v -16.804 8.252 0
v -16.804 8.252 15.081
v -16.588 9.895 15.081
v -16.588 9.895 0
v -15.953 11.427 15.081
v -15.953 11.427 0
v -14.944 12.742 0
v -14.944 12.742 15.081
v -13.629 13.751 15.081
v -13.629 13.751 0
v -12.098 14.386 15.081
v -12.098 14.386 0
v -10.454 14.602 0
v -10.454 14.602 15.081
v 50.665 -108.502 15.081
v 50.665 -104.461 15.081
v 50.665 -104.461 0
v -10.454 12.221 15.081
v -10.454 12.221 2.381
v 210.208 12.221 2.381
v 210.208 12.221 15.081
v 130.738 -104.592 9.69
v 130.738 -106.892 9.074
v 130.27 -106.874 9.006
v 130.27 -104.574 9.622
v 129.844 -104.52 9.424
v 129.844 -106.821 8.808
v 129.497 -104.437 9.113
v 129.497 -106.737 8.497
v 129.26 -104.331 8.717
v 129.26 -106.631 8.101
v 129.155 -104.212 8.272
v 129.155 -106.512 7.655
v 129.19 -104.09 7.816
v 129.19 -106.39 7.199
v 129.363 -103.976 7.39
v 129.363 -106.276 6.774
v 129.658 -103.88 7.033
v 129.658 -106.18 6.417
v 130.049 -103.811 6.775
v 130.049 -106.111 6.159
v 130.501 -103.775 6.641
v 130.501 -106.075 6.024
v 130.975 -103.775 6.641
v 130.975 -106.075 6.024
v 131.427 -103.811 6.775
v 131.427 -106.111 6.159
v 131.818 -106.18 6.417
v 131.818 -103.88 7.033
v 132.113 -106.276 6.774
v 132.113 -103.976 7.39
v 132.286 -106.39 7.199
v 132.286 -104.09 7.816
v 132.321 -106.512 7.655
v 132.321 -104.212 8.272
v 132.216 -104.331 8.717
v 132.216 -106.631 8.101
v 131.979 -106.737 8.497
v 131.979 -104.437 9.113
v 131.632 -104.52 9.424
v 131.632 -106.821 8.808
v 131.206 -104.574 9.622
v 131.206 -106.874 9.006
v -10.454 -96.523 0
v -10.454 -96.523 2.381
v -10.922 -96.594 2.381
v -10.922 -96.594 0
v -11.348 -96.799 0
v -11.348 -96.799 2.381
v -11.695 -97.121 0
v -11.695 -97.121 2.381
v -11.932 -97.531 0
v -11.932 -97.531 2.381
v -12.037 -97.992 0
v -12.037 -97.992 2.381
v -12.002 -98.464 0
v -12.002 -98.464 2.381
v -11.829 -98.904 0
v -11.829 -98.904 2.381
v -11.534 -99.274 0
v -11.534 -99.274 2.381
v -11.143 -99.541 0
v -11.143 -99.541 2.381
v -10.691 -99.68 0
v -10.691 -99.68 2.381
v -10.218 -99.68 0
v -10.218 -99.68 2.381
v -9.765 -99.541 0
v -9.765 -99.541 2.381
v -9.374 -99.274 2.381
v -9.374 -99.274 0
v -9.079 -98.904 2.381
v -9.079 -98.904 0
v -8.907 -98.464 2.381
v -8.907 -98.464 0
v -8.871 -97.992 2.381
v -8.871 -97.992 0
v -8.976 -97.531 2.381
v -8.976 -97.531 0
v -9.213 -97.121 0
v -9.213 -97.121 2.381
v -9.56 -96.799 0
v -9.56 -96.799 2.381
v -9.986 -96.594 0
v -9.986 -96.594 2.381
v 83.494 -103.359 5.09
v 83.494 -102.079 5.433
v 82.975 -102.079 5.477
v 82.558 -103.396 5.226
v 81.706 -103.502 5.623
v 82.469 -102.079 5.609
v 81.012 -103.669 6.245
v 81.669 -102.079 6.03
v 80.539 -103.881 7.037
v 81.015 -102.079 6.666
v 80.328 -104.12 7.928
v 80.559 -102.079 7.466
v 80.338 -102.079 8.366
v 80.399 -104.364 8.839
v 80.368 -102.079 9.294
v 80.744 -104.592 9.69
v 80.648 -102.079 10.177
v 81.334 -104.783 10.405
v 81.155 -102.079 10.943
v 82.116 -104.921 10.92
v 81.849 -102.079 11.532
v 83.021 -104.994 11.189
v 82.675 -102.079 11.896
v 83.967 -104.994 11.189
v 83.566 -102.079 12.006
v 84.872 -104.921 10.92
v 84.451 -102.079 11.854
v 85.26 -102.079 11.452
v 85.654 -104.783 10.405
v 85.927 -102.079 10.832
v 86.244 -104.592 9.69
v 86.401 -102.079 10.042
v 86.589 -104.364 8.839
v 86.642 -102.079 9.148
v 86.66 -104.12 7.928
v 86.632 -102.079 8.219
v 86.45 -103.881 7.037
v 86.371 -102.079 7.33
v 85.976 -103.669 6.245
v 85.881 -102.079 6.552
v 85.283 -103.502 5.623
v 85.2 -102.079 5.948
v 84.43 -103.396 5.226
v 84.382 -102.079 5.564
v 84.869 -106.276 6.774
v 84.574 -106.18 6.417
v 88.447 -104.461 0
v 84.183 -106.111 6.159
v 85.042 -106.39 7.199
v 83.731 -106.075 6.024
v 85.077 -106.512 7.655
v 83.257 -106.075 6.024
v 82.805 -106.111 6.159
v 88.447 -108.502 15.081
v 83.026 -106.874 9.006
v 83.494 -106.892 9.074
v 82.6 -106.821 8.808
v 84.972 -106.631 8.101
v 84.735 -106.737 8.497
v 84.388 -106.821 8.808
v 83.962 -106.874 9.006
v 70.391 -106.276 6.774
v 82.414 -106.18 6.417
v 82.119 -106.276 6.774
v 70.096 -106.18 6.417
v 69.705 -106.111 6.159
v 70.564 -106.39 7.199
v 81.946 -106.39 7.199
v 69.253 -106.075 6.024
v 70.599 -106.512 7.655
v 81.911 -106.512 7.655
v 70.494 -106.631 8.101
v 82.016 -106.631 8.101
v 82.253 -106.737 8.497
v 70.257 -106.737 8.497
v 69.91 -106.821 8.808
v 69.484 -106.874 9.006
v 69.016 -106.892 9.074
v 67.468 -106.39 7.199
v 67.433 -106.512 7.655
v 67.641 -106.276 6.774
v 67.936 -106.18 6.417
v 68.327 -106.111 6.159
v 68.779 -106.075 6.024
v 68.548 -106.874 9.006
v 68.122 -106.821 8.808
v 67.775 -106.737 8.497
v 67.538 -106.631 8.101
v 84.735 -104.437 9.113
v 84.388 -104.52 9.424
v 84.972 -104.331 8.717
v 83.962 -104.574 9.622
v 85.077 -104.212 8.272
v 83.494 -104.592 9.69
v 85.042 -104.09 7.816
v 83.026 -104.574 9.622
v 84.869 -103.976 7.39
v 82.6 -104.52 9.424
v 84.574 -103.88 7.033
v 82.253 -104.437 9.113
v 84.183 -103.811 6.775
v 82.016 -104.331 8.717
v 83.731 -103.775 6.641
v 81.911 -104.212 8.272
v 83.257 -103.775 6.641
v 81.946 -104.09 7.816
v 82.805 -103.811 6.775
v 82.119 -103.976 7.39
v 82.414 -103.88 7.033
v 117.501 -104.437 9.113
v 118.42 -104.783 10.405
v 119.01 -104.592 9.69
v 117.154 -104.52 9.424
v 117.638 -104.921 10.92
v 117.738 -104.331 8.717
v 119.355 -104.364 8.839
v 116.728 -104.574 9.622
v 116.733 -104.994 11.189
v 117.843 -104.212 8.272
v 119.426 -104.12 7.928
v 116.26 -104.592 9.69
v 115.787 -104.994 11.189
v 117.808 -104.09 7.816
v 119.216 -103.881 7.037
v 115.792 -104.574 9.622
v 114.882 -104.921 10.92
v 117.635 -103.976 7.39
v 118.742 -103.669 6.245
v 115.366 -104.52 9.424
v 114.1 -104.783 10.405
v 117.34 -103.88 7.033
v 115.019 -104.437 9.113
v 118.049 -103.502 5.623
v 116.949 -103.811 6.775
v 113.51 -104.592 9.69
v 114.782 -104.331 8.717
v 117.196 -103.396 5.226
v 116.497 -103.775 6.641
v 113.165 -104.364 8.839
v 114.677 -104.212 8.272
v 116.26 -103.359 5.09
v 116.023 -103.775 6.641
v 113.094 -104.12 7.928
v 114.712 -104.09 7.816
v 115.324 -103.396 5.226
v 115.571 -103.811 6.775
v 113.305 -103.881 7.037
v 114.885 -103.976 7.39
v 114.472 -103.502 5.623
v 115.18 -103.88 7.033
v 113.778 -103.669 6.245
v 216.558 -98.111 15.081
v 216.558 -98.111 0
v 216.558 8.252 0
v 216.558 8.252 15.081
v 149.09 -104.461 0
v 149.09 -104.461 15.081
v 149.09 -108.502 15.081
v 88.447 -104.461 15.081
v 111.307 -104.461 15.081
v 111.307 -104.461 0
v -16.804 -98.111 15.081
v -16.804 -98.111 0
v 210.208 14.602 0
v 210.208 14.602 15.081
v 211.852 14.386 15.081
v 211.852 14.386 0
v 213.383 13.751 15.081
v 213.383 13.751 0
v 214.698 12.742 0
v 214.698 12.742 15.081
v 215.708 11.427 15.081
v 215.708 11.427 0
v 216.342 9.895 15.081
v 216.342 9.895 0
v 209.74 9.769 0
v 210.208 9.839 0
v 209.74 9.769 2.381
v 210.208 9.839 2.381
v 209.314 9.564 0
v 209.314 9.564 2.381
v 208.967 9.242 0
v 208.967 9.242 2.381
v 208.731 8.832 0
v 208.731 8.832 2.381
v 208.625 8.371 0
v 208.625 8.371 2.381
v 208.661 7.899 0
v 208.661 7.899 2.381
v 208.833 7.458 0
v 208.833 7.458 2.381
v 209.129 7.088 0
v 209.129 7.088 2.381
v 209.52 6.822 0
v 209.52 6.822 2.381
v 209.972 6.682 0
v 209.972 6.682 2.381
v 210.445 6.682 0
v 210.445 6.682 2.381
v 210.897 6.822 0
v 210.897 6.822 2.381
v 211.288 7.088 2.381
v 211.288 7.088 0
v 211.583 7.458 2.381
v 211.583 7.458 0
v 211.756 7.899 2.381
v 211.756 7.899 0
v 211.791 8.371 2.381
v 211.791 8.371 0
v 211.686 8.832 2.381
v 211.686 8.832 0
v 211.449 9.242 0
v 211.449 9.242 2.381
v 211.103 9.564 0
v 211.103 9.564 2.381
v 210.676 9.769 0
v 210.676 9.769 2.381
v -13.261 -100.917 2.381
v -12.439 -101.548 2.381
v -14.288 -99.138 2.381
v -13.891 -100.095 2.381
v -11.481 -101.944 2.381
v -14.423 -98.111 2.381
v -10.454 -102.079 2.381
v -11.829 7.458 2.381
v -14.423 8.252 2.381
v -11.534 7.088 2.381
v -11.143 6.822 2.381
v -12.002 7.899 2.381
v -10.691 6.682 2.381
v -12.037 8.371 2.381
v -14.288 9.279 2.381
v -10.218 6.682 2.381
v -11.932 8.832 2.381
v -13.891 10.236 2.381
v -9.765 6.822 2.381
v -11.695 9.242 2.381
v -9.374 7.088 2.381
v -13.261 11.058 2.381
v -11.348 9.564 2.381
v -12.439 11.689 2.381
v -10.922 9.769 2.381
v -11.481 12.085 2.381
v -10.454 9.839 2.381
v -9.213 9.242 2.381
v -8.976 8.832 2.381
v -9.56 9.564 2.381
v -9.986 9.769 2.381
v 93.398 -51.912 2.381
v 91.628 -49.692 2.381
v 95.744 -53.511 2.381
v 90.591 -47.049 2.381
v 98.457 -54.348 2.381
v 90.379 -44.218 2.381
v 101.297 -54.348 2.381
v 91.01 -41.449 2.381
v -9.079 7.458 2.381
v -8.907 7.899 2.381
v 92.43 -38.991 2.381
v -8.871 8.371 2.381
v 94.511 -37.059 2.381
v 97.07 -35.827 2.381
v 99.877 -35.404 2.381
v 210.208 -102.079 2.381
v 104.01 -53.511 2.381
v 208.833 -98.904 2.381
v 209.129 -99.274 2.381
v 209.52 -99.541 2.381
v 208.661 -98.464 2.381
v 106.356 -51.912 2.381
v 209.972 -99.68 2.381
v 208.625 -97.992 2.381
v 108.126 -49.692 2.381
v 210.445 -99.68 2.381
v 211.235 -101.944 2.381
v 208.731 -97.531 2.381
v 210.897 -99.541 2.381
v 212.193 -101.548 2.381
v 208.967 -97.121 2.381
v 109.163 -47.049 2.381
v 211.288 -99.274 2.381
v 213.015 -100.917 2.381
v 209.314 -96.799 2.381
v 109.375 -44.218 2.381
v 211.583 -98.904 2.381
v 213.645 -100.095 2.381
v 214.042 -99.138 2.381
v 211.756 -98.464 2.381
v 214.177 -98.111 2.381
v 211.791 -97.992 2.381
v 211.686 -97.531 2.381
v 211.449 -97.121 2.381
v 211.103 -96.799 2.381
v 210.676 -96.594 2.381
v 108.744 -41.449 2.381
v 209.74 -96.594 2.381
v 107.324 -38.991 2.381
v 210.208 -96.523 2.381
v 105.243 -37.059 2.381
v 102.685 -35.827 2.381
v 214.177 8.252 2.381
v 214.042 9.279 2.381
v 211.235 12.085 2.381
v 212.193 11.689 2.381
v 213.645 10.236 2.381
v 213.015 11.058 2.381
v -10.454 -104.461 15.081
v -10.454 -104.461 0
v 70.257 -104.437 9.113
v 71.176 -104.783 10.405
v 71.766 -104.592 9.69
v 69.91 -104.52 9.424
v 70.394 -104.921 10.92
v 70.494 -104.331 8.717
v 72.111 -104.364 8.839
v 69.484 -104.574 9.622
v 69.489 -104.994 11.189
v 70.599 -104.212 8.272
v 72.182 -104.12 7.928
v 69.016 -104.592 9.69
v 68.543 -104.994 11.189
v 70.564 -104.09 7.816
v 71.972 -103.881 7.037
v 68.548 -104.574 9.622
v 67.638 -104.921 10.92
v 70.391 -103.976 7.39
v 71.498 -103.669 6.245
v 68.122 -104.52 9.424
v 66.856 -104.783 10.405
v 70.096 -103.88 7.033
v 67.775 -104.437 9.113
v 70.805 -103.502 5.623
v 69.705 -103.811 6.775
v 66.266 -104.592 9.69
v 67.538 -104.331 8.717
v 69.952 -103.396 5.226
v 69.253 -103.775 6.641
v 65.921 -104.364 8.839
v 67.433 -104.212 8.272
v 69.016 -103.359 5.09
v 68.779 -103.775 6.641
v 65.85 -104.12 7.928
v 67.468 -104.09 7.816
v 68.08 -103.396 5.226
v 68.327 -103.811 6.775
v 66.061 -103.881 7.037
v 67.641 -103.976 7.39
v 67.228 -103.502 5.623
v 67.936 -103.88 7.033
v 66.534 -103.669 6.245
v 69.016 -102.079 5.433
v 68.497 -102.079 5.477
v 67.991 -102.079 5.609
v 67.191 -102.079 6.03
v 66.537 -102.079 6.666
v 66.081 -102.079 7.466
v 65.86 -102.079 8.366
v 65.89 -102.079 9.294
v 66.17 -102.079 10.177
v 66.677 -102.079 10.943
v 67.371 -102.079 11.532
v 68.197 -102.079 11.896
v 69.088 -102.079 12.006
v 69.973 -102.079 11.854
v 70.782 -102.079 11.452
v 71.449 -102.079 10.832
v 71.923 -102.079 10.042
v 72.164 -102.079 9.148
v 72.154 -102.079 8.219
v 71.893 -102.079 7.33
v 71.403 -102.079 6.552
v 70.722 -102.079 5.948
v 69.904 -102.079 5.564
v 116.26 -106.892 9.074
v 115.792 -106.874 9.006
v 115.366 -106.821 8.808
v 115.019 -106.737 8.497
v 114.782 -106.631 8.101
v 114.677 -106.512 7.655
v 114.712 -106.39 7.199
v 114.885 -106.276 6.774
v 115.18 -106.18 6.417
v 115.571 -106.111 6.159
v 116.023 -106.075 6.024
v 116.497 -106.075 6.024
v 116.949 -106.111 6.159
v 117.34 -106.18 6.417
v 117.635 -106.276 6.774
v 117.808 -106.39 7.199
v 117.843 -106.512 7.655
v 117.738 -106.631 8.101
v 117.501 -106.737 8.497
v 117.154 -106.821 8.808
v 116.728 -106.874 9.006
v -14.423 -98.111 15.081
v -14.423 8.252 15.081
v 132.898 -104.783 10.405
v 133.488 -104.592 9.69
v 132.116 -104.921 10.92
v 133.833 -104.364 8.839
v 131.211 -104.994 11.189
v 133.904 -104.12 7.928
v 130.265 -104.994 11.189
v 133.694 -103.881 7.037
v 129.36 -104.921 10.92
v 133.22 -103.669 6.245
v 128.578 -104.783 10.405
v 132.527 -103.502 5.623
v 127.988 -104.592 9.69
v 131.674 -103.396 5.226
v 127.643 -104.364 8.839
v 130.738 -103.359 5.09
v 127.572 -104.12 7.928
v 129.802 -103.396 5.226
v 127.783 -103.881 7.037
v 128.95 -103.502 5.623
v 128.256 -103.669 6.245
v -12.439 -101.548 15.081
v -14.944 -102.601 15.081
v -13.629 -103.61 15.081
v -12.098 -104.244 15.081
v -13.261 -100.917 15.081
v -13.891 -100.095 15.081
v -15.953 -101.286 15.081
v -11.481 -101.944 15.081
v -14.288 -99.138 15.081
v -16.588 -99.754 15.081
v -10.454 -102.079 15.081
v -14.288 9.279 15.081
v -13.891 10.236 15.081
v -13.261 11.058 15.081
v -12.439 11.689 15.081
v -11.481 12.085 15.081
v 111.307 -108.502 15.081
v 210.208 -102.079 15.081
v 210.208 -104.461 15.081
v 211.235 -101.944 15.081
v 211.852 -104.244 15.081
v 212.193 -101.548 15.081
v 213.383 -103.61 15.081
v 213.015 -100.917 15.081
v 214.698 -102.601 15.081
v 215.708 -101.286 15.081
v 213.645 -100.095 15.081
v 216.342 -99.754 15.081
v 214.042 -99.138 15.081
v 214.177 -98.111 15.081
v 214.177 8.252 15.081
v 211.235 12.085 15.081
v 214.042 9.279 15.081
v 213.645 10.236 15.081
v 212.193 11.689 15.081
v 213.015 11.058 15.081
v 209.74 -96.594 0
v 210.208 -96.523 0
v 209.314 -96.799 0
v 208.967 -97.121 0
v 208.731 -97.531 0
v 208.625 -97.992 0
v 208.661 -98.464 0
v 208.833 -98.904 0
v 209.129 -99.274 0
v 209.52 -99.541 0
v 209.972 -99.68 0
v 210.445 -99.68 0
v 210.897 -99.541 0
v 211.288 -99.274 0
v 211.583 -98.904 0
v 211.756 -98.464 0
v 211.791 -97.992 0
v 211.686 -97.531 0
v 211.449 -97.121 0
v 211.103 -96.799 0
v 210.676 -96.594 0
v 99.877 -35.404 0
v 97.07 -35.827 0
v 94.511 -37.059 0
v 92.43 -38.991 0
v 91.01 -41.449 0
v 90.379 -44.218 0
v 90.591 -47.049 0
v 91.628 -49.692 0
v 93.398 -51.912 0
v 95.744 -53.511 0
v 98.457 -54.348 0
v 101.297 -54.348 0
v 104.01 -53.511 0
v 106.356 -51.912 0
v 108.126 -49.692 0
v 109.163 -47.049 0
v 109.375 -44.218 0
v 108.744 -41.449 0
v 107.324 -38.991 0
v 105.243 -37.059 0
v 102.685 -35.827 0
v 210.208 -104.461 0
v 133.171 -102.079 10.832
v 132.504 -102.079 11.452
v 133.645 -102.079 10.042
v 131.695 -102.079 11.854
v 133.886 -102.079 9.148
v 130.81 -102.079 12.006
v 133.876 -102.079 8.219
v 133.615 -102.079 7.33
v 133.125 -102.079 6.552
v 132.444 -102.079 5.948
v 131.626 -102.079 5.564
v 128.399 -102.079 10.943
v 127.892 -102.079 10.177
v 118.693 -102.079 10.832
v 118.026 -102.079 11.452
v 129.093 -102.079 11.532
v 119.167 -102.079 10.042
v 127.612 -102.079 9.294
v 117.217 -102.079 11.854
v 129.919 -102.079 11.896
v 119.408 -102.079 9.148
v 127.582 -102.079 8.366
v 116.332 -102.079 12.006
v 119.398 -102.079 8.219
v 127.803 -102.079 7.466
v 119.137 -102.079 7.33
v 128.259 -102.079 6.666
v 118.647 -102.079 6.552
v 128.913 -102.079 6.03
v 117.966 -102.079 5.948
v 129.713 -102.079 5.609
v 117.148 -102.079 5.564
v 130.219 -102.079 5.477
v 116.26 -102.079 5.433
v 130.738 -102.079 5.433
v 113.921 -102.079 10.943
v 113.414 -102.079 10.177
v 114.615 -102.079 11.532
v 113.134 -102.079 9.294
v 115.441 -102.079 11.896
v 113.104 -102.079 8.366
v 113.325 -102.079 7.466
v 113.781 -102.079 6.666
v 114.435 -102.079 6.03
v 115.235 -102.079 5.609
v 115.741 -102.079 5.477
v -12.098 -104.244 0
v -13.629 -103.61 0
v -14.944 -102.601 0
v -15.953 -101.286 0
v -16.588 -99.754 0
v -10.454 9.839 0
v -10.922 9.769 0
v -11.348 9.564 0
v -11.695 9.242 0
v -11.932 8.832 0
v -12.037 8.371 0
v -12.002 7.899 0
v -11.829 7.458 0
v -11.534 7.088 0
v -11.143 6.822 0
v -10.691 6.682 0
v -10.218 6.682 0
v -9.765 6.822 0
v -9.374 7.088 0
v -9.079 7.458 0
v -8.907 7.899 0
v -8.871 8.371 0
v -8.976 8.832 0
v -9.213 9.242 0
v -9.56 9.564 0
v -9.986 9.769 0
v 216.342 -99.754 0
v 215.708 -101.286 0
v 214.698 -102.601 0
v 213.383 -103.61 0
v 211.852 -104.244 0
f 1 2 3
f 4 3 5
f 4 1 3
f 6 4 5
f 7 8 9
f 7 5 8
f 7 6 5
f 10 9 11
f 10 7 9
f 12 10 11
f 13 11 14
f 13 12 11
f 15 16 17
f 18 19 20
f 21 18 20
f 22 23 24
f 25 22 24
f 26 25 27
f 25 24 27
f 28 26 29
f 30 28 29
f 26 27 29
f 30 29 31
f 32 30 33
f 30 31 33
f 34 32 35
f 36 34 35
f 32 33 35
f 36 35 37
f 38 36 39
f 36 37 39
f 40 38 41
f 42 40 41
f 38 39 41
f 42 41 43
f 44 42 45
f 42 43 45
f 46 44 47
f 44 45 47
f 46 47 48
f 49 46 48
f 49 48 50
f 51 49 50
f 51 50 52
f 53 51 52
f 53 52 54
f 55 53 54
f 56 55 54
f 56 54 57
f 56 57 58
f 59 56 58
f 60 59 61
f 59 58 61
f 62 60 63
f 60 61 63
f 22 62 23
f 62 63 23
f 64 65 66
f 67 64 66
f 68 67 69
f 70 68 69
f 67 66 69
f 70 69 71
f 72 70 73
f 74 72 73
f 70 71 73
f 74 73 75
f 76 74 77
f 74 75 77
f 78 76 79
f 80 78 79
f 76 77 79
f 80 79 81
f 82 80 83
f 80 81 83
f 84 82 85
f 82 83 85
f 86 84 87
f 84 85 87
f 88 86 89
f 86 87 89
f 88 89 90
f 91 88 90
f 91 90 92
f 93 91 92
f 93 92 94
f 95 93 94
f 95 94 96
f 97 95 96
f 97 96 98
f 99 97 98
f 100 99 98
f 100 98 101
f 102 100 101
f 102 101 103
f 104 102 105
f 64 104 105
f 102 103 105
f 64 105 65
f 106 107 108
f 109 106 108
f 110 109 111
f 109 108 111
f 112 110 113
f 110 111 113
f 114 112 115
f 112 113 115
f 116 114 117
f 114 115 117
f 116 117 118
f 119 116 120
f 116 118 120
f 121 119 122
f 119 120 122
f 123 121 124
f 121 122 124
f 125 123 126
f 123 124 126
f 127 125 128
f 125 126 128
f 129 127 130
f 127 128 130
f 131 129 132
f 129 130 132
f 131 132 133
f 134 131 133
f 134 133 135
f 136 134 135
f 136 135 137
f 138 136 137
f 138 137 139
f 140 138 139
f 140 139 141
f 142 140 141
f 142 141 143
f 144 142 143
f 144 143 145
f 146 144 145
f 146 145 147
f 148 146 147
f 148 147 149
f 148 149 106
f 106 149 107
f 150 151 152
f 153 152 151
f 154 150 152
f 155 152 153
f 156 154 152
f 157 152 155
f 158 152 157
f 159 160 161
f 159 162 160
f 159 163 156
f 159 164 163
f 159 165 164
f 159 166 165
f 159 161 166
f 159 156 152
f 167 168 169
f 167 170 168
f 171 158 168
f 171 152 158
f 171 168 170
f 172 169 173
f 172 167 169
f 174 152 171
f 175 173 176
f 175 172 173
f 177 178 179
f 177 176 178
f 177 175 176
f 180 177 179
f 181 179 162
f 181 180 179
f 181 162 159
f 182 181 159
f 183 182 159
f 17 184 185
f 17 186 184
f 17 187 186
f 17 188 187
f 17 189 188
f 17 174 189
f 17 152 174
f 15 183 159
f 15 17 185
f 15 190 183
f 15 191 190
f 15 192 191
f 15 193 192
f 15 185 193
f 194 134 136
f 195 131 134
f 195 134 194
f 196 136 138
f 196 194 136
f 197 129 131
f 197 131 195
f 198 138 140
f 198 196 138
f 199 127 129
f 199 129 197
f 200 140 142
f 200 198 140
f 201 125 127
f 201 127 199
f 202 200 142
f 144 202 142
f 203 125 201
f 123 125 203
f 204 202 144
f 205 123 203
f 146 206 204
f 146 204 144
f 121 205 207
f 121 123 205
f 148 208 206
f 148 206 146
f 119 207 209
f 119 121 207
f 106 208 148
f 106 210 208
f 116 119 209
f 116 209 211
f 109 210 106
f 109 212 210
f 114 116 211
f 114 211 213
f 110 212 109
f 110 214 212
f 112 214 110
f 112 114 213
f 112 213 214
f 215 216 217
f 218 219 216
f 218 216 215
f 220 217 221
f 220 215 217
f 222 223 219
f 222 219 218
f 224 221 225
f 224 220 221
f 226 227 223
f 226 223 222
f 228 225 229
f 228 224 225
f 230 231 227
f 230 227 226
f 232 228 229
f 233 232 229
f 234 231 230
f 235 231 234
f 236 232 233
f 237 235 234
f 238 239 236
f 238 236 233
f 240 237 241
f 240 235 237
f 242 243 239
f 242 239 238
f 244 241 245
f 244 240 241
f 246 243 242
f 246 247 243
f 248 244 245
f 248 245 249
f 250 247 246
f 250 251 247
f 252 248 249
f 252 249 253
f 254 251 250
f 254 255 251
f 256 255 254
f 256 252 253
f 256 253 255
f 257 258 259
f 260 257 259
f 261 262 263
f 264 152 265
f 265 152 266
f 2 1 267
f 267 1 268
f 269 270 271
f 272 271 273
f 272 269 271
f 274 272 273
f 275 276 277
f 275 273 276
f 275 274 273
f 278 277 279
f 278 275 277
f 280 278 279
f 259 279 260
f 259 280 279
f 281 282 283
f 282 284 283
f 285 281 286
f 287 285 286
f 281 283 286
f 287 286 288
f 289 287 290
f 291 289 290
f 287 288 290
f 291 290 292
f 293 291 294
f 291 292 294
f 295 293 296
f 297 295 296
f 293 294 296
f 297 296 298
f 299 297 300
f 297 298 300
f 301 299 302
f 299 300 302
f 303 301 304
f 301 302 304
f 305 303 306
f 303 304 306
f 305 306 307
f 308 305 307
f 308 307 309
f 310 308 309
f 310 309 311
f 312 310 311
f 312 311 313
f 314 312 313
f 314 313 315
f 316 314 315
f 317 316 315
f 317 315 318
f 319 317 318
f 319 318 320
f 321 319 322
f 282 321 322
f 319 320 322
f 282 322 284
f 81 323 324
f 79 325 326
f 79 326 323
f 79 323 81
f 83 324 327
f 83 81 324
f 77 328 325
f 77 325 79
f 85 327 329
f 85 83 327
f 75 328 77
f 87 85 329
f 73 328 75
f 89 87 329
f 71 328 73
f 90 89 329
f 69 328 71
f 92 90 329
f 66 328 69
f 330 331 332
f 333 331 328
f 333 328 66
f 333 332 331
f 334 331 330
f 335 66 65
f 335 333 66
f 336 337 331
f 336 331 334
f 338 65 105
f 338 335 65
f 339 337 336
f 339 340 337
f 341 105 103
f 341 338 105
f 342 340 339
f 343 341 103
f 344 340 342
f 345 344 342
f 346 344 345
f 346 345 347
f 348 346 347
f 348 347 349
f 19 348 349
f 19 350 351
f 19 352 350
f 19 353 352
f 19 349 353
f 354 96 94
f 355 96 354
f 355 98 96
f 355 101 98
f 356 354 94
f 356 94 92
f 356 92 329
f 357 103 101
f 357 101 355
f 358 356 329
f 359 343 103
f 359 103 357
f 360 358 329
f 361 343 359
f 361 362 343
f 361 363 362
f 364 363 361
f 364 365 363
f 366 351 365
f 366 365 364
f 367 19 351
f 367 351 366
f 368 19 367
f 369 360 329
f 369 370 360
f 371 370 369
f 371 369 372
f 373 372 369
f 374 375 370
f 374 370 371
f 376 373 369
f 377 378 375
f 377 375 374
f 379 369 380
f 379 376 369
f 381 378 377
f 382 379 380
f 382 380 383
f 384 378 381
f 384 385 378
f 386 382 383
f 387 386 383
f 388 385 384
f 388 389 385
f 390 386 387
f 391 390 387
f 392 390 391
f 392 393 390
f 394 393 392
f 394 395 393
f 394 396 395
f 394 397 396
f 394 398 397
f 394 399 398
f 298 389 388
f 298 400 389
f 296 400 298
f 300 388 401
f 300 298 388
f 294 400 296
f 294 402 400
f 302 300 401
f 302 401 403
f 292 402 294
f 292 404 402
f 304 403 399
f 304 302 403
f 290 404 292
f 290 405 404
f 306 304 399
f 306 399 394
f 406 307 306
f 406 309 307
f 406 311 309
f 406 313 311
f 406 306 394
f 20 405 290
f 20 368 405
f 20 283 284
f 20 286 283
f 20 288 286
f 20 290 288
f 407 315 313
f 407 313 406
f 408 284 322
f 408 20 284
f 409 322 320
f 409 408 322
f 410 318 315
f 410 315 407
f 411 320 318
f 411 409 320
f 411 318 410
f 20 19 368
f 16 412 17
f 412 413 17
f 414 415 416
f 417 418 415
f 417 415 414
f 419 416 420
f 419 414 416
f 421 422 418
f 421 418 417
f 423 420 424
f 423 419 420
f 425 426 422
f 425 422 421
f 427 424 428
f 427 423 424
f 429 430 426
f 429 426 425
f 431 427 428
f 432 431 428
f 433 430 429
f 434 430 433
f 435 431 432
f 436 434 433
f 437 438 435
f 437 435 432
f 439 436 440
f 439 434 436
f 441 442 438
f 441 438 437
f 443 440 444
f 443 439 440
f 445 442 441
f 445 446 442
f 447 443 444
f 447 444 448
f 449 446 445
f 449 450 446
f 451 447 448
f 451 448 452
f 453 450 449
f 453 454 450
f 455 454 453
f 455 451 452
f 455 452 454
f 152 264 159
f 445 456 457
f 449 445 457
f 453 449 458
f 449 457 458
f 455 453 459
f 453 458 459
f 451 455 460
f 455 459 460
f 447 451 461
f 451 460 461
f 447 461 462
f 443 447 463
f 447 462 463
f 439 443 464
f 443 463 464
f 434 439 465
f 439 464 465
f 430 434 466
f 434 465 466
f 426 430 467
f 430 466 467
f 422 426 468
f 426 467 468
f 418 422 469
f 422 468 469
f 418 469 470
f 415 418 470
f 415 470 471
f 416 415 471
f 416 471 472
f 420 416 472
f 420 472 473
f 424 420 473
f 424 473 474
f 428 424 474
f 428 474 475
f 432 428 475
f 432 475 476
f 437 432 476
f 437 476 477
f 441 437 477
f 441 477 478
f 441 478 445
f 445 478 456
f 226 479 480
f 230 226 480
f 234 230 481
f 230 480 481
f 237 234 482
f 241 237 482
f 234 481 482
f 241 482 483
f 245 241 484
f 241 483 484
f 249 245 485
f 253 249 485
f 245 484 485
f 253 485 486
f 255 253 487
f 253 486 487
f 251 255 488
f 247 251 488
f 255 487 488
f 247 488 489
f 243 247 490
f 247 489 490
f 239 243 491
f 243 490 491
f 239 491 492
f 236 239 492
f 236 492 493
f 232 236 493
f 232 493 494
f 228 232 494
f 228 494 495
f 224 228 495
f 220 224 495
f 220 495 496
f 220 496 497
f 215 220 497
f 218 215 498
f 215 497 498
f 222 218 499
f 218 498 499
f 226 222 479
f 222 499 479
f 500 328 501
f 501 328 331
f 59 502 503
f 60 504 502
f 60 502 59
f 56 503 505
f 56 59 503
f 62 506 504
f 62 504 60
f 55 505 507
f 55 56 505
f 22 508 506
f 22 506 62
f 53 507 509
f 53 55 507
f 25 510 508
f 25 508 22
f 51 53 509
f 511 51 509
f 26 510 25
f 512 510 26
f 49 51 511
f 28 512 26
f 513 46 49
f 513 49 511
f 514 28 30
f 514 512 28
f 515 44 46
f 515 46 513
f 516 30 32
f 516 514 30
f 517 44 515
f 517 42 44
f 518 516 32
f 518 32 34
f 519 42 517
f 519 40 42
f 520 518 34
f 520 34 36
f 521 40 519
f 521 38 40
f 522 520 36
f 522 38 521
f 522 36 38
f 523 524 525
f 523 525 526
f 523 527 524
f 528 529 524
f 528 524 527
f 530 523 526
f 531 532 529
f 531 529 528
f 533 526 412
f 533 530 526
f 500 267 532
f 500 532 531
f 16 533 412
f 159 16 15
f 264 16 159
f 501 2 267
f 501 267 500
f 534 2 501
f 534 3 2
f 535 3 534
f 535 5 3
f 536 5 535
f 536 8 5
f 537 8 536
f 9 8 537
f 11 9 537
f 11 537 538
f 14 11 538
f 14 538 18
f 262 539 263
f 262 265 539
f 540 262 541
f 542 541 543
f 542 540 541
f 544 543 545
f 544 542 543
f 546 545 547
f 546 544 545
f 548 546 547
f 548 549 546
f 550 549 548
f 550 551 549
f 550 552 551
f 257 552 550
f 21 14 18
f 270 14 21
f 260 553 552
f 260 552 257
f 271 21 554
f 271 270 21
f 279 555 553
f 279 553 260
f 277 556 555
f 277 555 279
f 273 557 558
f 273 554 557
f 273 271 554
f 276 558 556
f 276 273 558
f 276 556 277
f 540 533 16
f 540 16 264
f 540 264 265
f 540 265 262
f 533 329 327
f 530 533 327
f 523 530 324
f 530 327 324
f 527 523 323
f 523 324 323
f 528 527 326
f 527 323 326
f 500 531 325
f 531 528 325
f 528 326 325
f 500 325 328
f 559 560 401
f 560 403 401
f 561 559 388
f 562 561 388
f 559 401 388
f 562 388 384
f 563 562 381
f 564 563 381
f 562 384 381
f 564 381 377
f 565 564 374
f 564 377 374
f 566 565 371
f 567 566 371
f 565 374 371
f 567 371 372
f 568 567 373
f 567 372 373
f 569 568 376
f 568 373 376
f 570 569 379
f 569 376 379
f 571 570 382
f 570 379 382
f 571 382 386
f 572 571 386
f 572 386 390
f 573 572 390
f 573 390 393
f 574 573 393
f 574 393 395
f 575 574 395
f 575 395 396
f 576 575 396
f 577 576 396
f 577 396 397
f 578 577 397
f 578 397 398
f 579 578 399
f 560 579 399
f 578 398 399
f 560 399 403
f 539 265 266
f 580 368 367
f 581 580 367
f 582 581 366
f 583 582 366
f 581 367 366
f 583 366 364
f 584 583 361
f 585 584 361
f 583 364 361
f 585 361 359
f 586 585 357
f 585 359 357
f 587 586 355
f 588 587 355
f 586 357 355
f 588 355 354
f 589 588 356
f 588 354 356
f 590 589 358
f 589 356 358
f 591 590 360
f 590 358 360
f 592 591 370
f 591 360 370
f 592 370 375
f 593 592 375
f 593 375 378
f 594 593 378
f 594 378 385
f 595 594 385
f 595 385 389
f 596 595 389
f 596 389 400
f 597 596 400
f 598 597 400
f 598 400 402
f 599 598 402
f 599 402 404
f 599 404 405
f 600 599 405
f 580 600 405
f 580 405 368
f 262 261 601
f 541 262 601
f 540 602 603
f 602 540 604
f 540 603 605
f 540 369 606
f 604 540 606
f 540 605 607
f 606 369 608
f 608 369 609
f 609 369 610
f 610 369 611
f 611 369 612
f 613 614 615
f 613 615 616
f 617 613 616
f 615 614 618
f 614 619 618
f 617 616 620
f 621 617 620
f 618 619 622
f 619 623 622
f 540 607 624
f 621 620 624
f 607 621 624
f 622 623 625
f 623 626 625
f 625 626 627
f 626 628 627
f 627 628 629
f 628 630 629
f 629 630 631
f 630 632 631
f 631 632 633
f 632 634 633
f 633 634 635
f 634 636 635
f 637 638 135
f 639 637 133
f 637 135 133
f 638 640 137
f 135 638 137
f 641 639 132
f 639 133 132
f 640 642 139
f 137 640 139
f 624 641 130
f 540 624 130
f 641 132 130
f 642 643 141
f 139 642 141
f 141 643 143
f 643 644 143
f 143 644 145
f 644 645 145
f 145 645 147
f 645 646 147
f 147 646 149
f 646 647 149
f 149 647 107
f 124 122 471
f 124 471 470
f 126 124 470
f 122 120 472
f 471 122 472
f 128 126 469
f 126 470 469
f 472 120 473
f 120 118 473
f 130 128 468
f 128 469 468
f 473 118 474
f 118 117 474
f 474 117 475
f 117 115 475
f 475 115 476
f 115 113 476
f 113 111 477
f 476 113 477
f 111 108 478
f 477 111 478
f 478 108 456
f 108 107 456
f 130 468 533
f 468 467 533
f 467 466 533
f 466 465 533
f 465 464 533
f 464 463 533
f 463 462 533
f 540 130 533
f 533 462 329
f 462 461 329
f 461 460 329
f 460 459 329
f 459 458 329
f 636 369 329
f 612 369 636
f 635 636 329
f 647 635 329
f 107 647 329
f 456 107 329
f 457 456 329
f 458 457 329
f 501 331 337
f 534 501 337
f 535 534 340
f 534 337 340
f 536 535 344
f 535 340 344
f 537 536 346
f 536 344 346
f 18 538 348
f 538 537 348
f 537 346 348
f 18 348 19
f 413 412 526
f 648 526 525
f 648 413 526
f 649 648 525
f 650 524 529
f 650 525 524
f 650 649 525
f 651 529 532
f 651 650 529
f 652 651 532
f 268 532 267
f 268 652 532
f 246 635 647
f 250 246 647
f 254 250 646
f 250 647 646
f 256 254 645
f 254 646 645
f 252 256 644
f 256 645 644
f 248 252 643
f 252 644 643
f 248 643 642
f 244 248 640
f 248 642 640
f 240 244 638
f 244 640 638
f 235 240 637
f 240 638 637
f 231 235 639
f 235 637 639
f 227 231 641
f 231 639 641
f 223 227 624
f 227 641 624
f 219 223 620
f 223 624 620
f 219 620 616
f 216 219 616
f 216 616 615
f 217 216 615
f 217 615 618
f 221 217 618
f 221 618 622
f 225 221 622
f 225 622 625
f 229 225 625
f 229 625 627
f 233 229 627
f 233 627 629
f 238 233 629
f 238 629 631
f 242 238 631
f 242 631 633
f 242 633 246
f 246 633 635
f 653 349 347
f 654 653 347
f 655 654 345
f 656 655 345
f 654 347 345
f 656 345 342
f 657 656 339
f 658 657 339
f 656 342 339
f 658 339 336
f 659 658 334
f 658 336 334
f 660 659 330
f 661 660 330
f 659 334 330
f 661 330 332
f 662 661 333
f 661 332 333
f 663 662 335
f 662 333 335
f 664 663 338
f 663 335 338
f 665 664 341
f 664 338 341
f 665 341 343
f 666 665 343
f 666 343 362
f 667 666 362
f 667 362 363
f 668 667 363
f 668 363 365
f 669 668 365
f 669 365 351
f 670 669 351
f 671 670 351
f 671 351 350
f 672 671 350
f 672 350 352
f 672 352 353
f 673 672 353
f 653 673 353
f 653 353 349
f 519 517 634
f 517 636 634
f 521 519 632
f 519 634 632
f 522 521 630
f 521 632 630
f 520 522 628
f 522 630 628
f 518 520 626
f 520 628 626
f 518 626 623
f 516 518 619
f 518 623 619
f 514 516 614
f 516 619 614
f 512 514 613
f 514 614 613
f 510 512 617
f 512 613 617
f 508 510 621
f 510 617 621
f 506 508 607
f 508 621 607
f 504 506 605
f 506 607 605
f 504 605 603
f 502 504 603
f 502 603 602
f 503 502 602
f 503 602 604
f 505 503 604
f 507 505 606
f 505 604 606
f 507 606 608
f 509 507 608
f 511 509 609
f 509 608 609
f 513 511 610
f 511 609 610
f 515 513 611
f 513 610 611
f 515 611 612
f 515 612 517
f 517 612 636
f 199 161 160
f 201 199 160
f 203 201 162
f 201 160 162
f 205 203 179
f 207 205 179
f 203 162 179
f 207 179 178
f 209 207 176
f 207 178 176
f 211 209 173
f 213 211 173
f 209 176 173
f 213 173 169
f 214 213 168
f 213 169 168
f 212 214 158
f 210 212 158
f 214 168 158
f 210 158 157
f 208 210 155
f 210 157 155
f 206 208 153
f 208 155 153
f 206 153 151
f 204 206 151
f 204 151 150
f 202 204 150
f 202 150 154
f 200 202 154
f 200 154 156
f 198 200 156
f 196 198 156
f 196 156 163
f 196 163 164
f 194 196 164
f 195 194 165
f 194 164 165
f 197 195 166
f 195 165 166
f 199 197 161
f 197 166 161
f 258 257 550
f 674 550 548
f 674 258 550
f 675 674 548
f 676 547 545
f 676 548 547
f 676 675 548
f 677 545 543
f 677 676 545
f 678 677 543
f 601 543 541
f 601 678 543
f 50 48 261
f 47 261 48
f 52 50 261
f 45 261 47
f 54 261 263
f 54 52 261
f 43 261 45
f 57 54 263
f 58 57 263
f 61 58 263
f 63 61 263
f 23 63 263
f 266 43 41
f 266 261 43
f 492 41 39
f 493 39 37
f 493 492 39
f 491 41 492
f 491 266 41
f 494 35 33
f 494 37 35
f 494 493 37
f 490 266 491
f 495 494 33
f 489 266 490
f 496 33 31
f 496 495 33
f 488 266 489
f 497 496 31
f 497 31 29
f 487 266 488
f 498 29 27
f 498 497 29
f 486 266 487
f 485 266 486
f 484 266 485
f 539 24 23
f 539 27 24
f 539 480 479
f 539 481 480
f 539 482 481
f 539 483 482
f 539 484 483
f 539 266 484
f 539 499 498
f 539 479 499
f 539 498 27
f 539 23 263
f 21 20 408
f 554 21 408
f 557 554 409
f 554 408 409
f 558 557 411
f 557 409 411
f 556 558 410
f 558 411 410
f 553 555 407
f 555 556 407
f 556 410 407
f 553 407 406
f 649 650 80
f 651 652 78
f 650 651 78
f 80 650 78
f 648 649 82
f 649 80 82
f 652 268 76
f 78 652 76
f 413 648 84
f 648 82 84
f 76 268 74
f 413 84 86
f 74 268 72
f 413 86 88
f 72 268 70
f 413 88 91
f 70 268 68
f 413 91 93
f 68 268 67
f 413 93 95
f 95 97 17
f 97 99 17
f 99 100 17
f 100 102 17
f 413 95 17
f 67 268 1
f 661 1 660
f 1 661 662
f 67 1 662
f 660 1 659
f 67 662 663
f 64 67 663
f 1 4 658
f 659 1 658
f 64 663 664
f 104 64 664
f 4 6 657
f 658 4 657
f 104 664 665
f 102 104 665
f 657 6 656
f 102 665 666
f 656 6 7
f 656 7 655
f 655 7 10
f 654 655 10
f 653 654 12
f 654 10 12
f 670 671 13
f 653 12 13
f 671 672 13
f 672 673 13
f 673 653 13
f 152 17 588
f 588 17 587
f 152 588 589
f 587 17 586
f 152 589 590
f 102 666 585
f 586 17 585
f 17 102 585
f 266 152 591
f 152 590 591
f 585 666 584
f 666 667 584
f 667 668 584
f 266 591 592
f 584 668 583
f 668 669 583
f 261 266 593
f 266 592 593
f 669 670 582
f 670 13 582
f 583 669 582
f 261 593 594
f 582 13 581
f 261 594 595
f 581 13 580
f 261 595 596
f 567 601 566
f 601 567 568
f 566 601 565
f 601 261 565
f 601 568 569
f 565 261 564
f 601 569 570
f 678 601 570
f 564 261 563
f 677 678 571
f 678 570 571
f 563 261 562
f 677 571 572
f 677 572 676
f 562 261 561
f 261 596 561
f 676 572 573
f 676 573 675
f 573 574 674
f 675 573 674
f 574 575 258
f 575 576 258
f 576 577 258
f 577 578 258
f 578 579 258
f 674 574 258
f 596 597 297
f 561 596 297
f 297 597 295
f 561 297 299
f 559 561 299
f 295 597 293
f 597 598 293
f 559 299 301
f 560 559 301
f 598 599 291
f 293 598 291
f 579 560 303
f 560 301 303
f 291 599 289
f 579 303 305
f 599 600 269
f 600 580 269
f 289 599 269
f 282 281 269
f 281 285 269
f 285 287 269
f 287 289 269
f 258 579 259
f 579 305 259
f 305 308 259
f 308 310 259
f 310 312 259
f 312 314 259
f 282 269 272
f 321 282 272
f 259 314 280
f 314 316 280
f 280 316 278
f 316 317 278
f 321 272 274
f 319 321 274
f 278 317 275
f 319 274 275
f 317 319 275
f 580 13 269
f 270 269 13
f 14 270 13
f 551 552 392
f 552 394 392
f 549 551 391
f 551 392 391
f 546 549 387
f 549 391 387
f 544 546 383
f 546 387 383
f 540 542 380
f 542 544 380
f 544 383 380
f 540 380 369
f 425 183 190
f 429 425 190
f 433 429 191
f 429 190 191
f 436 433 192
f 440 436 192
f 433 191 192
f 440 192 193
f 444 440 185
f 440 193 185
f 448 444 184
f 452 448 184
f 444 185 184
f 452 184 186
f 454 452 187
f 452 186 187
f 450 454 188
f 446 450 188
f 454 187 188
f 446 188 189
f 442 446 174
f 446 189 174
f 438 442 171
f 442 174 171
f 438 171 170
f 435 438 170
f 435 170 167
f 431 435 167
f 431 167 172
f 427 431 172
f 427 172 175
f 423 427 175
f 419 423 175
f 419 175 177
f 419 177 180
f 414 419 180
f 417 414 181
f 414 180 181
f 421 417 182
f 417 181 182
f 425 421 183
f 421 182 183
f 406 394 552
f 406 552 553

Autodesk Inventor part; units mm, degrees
ref_plane "YZ Plane" through (0, 0, 0) normal (1, 0, 0) x (0, 1, 0)
ref_plane "XZ Plane" through (0, 0, 0) normal (0, 1, 0) x (-1, 0, 0)
sketch "Sketch1" plane through (0, 0, 0) normal (0, 0, 1) x (1, 0, 0)
  line L0 (-10.454202, 14.601943) -> (210.208298, 14.601943)
  line L1 (216.558298, 8.251943) -> (216.558298, -98.110557)
  line L2 (210.208298, -104.460557) -> (-10.454202, -104.460557)
  line L3 (-16.804202, -98.110557) -> (-16.804202, 8.251943)
  line L4 (99.877048, 12.220693) -> (-10.454202, 12.220693)
  line L5 (-14.422952, 8.251943) -> (-14.422952, -44.929307)
  line L6 (99.877048, 12.220693) -> (210.208298, 12.220693)
  line L7 (214.177048, 8.251943) -> (214.177048, -44.929307)
  line L8 (99.877048, -102.079307) -> (210.208298, -102.079307)
  line L9 (214.177048, -98.110557) -> (214.177048, -44.929307)
  line L10 (99.877048, -102.079307) -> (-10.454202, -102.079307)
  line L11 (-14.422952, -98.110557) -> (-14.422952, -44.929307)
  arc A0 (-10.454202, 14.601943) -> (-16.804202, 8.251943) centre (-10.454202, 8.251943) ccw
  arc A1 (216.558298, 8.251943) -> (210.208298, 14.601943) centre (210.208298, 8.251943) ccw
  arc A2 (210.208298, -104.460557) -> (216.558298, -98.110557) centre (210.208298, -98.110557) ccw
  arc A3 (-16.804202, -98.110557) -> (-10.454202, -104.460557) centre (-10.454202, -98.110557) ccw
  arc A4 (-10.454202, 12.220693) -> (-14.422952, 8.251943) centre (-10.454202, 8.251943) ccw
  arc A5 (214.177048, 8.251943) -> (210.208298, 12.220693) centre (210.208298, 8.251943) ccw
  arc A6 (210.208298, -102.079307) -> (214.177048, -98.110557) centre (210.208298, -98.110557) ccw
  arc A7 (-14.422952, -98.110557) -> (-10.454202, -102.079307) centre (-10.454202, -98.110557) ccw
  point P0 (0, 0)
  point P1 (-16.804202, 14.601943)
  point P2 (216.558298, -104.460557)
  point P3 (216.558298, 14.601943)
  point P4 (-16.804202, -104.460557)
  dimension "d0" = 233.3625
  dimension "d1" = 119.0625
  dimension "d9" = 6.35
  dimension "d10" = 3.96875
extrude "Extrusion1" add sketch "Sketch1" along normal blind 2.38125 contours L0 A1 L1 A2 L2 A3 L3 A0 | L6 A5 L7 L9 A6 L8 L10 A7 L11 L5 A4 L4
sketch "Sketch2" plane through (0, 0, 2.38125) normal (0, 0, 1) x (1, 0, 0)
  line L0 (210.208298, 14.601943) -> (-10.454202, 14.601943)
  arc A0 (-10.454202, 14.601943) -> (-16.804202, 8.251943) centre (-10.454202, 8.251943) ccw
  line L1 (-16.804202, 8.251943) -> (-16.804202, -98.110557)
  arc A1 (-16.804202, -98.110557) -> (-10.454202, -104.460557) centre (-10.454202, -98.110557) ccw
  line L2 (-10.454202, -104.460557) -> (210.208298, -104.460557)
  arc A2 (210.208298, -104.460557) -> (216.558298, -98.110557) centre (210.208298, -98.110557) ccw
  line L3 (216.558298, -98.110557) -> (216.558298, 8.251943)
  arc A3 (216.558298, 8.251943) -> (210.208298, 14.601943) centre (210.208298, 8.251943) ccw
  line L4 (99.877048, 12.220693) -> (-10.454202, 12.220693)
  line L5 (-14.422952, 8.251943) -> (-14.422952, -44.929307)
  line L6 (99.877048, -102.079307) -> (-10.454202, -102.079307)
  line L7 (-14.422952, -98.110557) -> (-14.422952, -44.929307)
  line L8 (99.877048, -102.079307) -> (210.208298, -102.079307)
  line L9 (214.177048, -98.110557) -> (214.177048, -44.929307)
  line L10 (99.877048, 12.220693) -> (210.208298, 12.220693)
  line L11 (214.177048, 8.251943) -> (214.177048, -44.929307)
  arc A4 (-10.454202, 12.220693) -> (-14.422952, 8.251943) centre (-10.454202, 8.251943) ccw
  arc A5 (214.177048, 8.251943) -> (210.208298, 12.220693) centre (210.208298, 8.251943) ccw
  arc A6 (210.208298, -102.079307) -> (214.177048, -98.110557) centre (210.208298, -98.110557) ccw
  arc A7 (-14.422952, -98.110557) -> (-10.454202, -102.079307) centre (-10.454202, -98.110557) ccw
  point P0 (0, 0)
  dimension "d15" = 3.96875
extrude "Extrusion2" add sketch "Sketch2" along normal blind 2.38125
sketch "Sketch3" plane through (0, 0, 4.7625) normal (0, 0, 1) x (1, 0, 0)
  arc A0 (-10.454202, 12.220693) -> (-14.422952, 8.251943) centre (-10.454202, 8.251943) ccw
  line L0 (-10.454202, 12.220693) -> (210.208298, 12.220693)
  arc A1 (214.177048, 8.251943) -> (210.208298, 12.220693) centre (210.208298, 8.251943) ccw
  line L1 (214.177048, 8.251943) -> (214.177048, -98.110557)
  arc A2 (210.208298, -102.079307) -> (214.177048, -98.110557) centre (210.208298, -98.110557) ccw
  line L2 (210.208298, -102.079307) -> (-10.454202, -102.079307)
  arc A3 (-14.422952, -98.110557) -> (-10.454202, -102.079307) centre (-10.454202, -98.110557) ccw
  line L3 (-14.422952, -98.110557) -> (-14.422952, 8.251943)
  line L4 (210.208298, 14.601943) -> (-10.454202, 14.601943)
  arc A4 (-10.454202, 14.601943) -> (-16.804202, 8.251943) centre (-10.454202, 8.251943) ccw
  line L5 (-16.804202, 8.251943) -> (-16.804202, -98.110557)
  arc A5 (-16.804202, -98.110557) -> (-10.454202, -104.460557) centre (-10.454202, -98.110557) ccw
  line L6 (-10.454202, -104.460557) -> (210.208298, -104.460557)
  arc A6 (210.208298, -104.460557) -> (216.558298, -98.110557) centre (210.208298, -98.110557) ccw
  line L7 (216.558298, -98.110557) -> (216.558298, 8.251943)
  arc A7 (216.558298, 8.251943) -> (210.208298, 14.601943) centre (210.208298, 8.251943) ccw
  line L8 (214.177048, -44.929307) -> (214.177048, -41.754307)
  line L9 (214.177048, -41.754307) -> (216.558298, -41.754307)
  line L10 (216.558298, -41.754307) -> (216.558298, -44.929307)
  line L11 (216.558298, -44.929307) -> (216.558298, -48.104307)
  line L12 (216.558298, -48.104307) -> (214.177048, -48.104307)
  line L13 (214.177048, -48.104307) -> (214.177048, -44.929307)
  line L14 (-14.422952, -44.929307) -> (-14.422952, -41.754307)
  line L15 (-14.422952, -41.754307) -> (-16.804202, -41.754307)
  line L16 (-16.804202, -41.754307) -> (-16.804202, -44.929307)
  line L17 (-16.804202, -44.929307) -> (-16.804202, -48.104307)
  line L18 (-16.804202, -48.104307) -> (-14.422952, -48.104307)
  line L19 (-14.422952, -48.104307) -> (-14.422952, -44.929307)
  point P0 (0, 0)
  dimension "d18" = 3.175
  dimension "d19" = 3.175
  dimension "d20" = 3.175
  dimension "d21" = 3.175
extrude "Extrusion3" add sketch "Sketch3" along normal blind 10.31875 contours A0 L3 L15 L5 A4 L4 A7 L7 L9 L1 A1 L0 | L3 A3 L2 A2 L1 L12 L7 A6 L6 A5 L5 L18
sketch "Sketch4" plane through (0, 0, 15.08125) normal (0, 0, 1) x (1, 0, 0)
  line L0 (214.177048, -41.754307) -> (216.558298, -41.754307)
  line L1 (216.558298, -41.754307) -> (216.558298, -48.104307)
  line L2 (216.558298, -48.104307) -> (214.177048, -48.104307)
  line L3 (214.177048, -48.104307) -> (214.177048, -41.754307)
  line L4 (-16.804202, -41.754307) -> (-14.422952, -41.754307)
  line L5 (-14.422952, -41.754307) -> (-14.422952, -48.104307)
  line L6 (-14.422952, -48.104307) -> (-16.804202, -48.104307)
  line L7 (-16.804202, -48.104307) -> (-16.804202, -41.754307)
  point P0 (0, 0)
  dimension "d24" = 2.38125
  dimension "d25" = 6.35
  dimension "d26" = 2.38125
  dimension "d27" = 6.35
extrude "Extrusion4" add sketch "Sketch4" against normal blind 7.9375
sketch "Sketch5" plane through (0, 0, 0) normal (0, 0, -1) x (-1, 0, 0)
  arc A0 (-210.208298, 14.601943) -> (-216.558298, 8.251943) centre (-210.208298, 8.251943) ccw
  line L0 (-210.208298, 8.251943) -> (-99.877048, 8.251943)
  line L1 (-99.877048, 8.251943) -> (-99.877048, -44.929307)
  line L2 (-99.877048, -44.929307) -> (-210.208298, -44.929307)
  line L3 (-210.208298, -44.929307) -> (-210.208298, 8.251943)
  point P0 (0, 0)
hole "Hole1" at (99.877048, -44.929307, 0) direction (0, 0, 1) diameter 19.05 end through all
sketch "Sketch7" plane through (-10.454202, -104.460557, 0) normal (0, -1, 0) x (1, 0, 0)
  line L0 (220.6625, 0) -> (0, 0)
  line L1 (0, 15.08125) -> (220.6625, 15.08125)
  line L2 (61.11875, 15.08125) -> (61.11875, 0)
  line L3 (159.54375, 15.08125) -> (159.54375, 0)
  line L4 (61.11875, 15.08125) -> (159.54375, 15.08125)
  line L5 (159.54375, 0) -> (61.11875, 0)
  point P0 (10.454202, 0)
extrude "Extrusion5" add sketch "Sketch7" along normal blind 25.4
sketch "Sketch8" plane through (149.089548, -104.460557, 15.08125) normal (1, 0, 0) x (0, 0, -1)
  line L0 (15.08125, 0) -> (-19.502452, -9.266675)
  line L1 (15.08125, 0) -> (50.884933, 0) construction
  point P0 (15.08125, 104.460557)
  dimension "d41" = 165
split body "Split1" sketch "Sketch8" result one side removed curves L0 removed pieces at (116.281215, -121.39389, 0.5)
ref_plane "Work Plane1" through (50.664548, -102.160446, 0.616313) normal (0, -0.9659258, -0.258819) x (1, 0, 0)
sketch "Sketch10" plane through (0, 0, 15.08125) normal (0, 0, 1) x (1, 0, 0)
  line L0 (99.877048, -104.460557) -> (111.307048, -104.460557)
  line L1 (111.307048, -104.460557) -> (111.307048, -108.501565)
  line L2 (99.877048, -104.460557) -> (88.447048, -104.460557)
  line L3 (88.447048, -104.460557) -> (88.447048, -108.501565)
  line L4 (88.447048, -108.501565) -> (111.307048, -108.501565)
  point P0 (0, 0)
  dimension "d43" = 11.43
  dimension "d44" = 11.43
split body "Split2" sketch "Sketch10" result one side removed curves L4 L1 L0 L2 L3 removed pieces at (99.877048, -106.671599, 10.183576)
sketch "Sketch13" plane through (50.664548, -102.160446, 0.616313) normal (0, -0.9659258, -0.258819) x (1, 0, 0)
  line L0 (37.7825, 0) -> (37.7825, 15.613259)
  line L1 (0, 15.613259) -> (37.7825, 15.613259)
  line L2 (0, 0) -> (0, 15.613259)
  line L3 (37.7825, 0) -> (0, 0)
  line L4 (60.6425, 15.613259) -> (60.6425, 0)
  line L5 (98.425, 0) -> (60.6425, 0)
  line L6 (98.425, 15.613259) -> (98.425, 0)
  line L7 (60.6425, 15.613259) -> (98.425, 15.613259)
  line L8 (0, 15.613259) -> (98.425, 15.613259)
  line L9 (49.2125, 15.613259) -> (49.2125, 0)
  line L10 (49.2125, 7.806629) -> (32.8295, 7.806629)
  line L11 (49.2125, 7.806629) -> (65.5955, 7.806629)
  line L12 (65.5955, 7.806629) -> (80.0735, 7.806629)
  line L13 (32.8295, 7.806629) -> (18.3515, 7.806629)
  point P0 (-50.664548, -27.036381)
  dimension "d45" = 16.383
  dimension "d46" = 16.383
  dimension "d47" = 14.478
  dimension "d48" = 14.478
hole "Hole2" at (69.016048, -104.18095, 8.156938) at (116.260048, -104.18095, 8.156938) at (83.494048, -104.18095, 8.156938) at (130.738048, -104.18095, 8.156938) direction (0, 0.9659258, 0.258819) diameter 6.35 end through all
sketch "Sketch14" plane through (50.664548, -102.160446, 0.616313) normal (0, -0.9659258, -0.258819) x (1, 0, 0)
  line L0 (37.7825, 0) -> (37.7825, 15.613259)
  line L1 (0, 15.613259) -> (37.7825, 15.613259)
  line L2 (0, 0) -> (0, 15.613259)
  line L3 (37.7825, 0) -> (0, 0)
  line L4 (60.6425, 15.613259) -> (60.6425, 0)
  line L5 (98.425, 0) -> (60.6425, 0)
  line L6 (98.425, 15.613259) -> (98.425, 0)
  line L7 (60.6425, 15.613259) -> (98.425, 15.613259)
  line L8 (0, 15.613259) -> (98.425, 15.613259)
  line L9 (49.2125, 15.613259) -> (49.2125, 0)
  line L10 (49.2125, 7.806629) -> (65.5955, 7.806629)
  line L11 (65.5955, 7.806629) -> (80.0735, 7.806629)
  line L12 (49.2125, 7.806629) -> (32.8295, 7.806629)
  line L13 (32.8295, 7.806629) -> (18.3515, 7.806629)
  point P0 (-50.664548, -27.036381)
  dimension "d56" = 16.383
  dimension "d57" = 14.478
  dimension "d58" = 16.383
  dimension "d59" = 14.478
hole "Hole3" at (69.016048, -104.18095, 8.156938) at (83.494048, -104.18095, 8.156938) at (116.260048, -104.18095, 8.156938) at (130.738048, -104.18095, 8.156938) direction (0, -0.9659258, -0.258819) diameter 3.175 end through all
sketch "Sketch15" plane through (0, 0, 4.7625) normal (0, 0, 1) x (1, 0, 0)
  line L0 (216.558298, -41.754307) -> (214.177048, -41.754307)
  line L1 (214.177048, -41.754307) -> (214.177048, -48.104307)
  line L2 (216.558298, -41.754307) -> (214.177048, -41.754307)
  line L3 (214.177048, -41.754307) -> (214.177048, -48.104307)
  line L4 (214.177048, -48.104307) -> (216.558298, -48.104307)
  line L5 (216.558298, -48.104307) -> (216.558298, -41.754307)
  point P0 (0, 0)
extrude "Extrusion6" add sketch "Sketch15" along normal blind 2.3876
sketch "Sketch16" plane through (0, 0, 4.7625) normal (0, 0, 1) x (1, 0, 0)
  line L0 (-14.422952, -41.754307) -> (-16.804202, -41.754307)
  line L1 (-16.804202, -41.754307) -> (-16.804202, -48.104307)
  line L2 (-14.422952, -41.754307) -> (-16.804202, -41.754307)
  line L3 (-16.804202, -41.754307) -> (-16.804202, -48.104307)
  line L4 (-16.804202, -48.104307) -> (-14.422952, -48.104307)
  line L5 (-14.422952, -48.104307) -> (-14.422952, -41.754307)
  point P0 (0, 0)
extrude "Extrusion7" add sketch "Sketch16" along normal blind 2.3876
sketch "Sketch17" plane through (0, 0, 0) normal (0, 0, -1) x (-1, 0, 0)
  arc A0 (10.454202, -104.460557) -> (16.804202, -98.110557) centre (10.454202, -98.110557) ccw
  arc A1 (16.804202, 8.251943) -> (10.454202, 14.601943) centre (10.454202, 8.251943) ccw
  arc A2 (-210.208298, 14.601943) -> (-216.558298, 8.251943) centre (-210.208298, 8.251943) ccw
  arc A3 (-216.558298, -98.110557) -> (-210.208298, -104.460557) centre (-210.208298, -98.110557) ccw
  point P0 (0, 0)
hole "Hole4" at (210.208298, 8.251943, 0) at (-10.454202, 8.251943, 0) at (-10.454202, -98.110557, 0) at (210.208298, -98.110557, 0) direction (0, 0, 1) diameter 3.175 end through all
properties part number "Master Tablet Enclosure"
